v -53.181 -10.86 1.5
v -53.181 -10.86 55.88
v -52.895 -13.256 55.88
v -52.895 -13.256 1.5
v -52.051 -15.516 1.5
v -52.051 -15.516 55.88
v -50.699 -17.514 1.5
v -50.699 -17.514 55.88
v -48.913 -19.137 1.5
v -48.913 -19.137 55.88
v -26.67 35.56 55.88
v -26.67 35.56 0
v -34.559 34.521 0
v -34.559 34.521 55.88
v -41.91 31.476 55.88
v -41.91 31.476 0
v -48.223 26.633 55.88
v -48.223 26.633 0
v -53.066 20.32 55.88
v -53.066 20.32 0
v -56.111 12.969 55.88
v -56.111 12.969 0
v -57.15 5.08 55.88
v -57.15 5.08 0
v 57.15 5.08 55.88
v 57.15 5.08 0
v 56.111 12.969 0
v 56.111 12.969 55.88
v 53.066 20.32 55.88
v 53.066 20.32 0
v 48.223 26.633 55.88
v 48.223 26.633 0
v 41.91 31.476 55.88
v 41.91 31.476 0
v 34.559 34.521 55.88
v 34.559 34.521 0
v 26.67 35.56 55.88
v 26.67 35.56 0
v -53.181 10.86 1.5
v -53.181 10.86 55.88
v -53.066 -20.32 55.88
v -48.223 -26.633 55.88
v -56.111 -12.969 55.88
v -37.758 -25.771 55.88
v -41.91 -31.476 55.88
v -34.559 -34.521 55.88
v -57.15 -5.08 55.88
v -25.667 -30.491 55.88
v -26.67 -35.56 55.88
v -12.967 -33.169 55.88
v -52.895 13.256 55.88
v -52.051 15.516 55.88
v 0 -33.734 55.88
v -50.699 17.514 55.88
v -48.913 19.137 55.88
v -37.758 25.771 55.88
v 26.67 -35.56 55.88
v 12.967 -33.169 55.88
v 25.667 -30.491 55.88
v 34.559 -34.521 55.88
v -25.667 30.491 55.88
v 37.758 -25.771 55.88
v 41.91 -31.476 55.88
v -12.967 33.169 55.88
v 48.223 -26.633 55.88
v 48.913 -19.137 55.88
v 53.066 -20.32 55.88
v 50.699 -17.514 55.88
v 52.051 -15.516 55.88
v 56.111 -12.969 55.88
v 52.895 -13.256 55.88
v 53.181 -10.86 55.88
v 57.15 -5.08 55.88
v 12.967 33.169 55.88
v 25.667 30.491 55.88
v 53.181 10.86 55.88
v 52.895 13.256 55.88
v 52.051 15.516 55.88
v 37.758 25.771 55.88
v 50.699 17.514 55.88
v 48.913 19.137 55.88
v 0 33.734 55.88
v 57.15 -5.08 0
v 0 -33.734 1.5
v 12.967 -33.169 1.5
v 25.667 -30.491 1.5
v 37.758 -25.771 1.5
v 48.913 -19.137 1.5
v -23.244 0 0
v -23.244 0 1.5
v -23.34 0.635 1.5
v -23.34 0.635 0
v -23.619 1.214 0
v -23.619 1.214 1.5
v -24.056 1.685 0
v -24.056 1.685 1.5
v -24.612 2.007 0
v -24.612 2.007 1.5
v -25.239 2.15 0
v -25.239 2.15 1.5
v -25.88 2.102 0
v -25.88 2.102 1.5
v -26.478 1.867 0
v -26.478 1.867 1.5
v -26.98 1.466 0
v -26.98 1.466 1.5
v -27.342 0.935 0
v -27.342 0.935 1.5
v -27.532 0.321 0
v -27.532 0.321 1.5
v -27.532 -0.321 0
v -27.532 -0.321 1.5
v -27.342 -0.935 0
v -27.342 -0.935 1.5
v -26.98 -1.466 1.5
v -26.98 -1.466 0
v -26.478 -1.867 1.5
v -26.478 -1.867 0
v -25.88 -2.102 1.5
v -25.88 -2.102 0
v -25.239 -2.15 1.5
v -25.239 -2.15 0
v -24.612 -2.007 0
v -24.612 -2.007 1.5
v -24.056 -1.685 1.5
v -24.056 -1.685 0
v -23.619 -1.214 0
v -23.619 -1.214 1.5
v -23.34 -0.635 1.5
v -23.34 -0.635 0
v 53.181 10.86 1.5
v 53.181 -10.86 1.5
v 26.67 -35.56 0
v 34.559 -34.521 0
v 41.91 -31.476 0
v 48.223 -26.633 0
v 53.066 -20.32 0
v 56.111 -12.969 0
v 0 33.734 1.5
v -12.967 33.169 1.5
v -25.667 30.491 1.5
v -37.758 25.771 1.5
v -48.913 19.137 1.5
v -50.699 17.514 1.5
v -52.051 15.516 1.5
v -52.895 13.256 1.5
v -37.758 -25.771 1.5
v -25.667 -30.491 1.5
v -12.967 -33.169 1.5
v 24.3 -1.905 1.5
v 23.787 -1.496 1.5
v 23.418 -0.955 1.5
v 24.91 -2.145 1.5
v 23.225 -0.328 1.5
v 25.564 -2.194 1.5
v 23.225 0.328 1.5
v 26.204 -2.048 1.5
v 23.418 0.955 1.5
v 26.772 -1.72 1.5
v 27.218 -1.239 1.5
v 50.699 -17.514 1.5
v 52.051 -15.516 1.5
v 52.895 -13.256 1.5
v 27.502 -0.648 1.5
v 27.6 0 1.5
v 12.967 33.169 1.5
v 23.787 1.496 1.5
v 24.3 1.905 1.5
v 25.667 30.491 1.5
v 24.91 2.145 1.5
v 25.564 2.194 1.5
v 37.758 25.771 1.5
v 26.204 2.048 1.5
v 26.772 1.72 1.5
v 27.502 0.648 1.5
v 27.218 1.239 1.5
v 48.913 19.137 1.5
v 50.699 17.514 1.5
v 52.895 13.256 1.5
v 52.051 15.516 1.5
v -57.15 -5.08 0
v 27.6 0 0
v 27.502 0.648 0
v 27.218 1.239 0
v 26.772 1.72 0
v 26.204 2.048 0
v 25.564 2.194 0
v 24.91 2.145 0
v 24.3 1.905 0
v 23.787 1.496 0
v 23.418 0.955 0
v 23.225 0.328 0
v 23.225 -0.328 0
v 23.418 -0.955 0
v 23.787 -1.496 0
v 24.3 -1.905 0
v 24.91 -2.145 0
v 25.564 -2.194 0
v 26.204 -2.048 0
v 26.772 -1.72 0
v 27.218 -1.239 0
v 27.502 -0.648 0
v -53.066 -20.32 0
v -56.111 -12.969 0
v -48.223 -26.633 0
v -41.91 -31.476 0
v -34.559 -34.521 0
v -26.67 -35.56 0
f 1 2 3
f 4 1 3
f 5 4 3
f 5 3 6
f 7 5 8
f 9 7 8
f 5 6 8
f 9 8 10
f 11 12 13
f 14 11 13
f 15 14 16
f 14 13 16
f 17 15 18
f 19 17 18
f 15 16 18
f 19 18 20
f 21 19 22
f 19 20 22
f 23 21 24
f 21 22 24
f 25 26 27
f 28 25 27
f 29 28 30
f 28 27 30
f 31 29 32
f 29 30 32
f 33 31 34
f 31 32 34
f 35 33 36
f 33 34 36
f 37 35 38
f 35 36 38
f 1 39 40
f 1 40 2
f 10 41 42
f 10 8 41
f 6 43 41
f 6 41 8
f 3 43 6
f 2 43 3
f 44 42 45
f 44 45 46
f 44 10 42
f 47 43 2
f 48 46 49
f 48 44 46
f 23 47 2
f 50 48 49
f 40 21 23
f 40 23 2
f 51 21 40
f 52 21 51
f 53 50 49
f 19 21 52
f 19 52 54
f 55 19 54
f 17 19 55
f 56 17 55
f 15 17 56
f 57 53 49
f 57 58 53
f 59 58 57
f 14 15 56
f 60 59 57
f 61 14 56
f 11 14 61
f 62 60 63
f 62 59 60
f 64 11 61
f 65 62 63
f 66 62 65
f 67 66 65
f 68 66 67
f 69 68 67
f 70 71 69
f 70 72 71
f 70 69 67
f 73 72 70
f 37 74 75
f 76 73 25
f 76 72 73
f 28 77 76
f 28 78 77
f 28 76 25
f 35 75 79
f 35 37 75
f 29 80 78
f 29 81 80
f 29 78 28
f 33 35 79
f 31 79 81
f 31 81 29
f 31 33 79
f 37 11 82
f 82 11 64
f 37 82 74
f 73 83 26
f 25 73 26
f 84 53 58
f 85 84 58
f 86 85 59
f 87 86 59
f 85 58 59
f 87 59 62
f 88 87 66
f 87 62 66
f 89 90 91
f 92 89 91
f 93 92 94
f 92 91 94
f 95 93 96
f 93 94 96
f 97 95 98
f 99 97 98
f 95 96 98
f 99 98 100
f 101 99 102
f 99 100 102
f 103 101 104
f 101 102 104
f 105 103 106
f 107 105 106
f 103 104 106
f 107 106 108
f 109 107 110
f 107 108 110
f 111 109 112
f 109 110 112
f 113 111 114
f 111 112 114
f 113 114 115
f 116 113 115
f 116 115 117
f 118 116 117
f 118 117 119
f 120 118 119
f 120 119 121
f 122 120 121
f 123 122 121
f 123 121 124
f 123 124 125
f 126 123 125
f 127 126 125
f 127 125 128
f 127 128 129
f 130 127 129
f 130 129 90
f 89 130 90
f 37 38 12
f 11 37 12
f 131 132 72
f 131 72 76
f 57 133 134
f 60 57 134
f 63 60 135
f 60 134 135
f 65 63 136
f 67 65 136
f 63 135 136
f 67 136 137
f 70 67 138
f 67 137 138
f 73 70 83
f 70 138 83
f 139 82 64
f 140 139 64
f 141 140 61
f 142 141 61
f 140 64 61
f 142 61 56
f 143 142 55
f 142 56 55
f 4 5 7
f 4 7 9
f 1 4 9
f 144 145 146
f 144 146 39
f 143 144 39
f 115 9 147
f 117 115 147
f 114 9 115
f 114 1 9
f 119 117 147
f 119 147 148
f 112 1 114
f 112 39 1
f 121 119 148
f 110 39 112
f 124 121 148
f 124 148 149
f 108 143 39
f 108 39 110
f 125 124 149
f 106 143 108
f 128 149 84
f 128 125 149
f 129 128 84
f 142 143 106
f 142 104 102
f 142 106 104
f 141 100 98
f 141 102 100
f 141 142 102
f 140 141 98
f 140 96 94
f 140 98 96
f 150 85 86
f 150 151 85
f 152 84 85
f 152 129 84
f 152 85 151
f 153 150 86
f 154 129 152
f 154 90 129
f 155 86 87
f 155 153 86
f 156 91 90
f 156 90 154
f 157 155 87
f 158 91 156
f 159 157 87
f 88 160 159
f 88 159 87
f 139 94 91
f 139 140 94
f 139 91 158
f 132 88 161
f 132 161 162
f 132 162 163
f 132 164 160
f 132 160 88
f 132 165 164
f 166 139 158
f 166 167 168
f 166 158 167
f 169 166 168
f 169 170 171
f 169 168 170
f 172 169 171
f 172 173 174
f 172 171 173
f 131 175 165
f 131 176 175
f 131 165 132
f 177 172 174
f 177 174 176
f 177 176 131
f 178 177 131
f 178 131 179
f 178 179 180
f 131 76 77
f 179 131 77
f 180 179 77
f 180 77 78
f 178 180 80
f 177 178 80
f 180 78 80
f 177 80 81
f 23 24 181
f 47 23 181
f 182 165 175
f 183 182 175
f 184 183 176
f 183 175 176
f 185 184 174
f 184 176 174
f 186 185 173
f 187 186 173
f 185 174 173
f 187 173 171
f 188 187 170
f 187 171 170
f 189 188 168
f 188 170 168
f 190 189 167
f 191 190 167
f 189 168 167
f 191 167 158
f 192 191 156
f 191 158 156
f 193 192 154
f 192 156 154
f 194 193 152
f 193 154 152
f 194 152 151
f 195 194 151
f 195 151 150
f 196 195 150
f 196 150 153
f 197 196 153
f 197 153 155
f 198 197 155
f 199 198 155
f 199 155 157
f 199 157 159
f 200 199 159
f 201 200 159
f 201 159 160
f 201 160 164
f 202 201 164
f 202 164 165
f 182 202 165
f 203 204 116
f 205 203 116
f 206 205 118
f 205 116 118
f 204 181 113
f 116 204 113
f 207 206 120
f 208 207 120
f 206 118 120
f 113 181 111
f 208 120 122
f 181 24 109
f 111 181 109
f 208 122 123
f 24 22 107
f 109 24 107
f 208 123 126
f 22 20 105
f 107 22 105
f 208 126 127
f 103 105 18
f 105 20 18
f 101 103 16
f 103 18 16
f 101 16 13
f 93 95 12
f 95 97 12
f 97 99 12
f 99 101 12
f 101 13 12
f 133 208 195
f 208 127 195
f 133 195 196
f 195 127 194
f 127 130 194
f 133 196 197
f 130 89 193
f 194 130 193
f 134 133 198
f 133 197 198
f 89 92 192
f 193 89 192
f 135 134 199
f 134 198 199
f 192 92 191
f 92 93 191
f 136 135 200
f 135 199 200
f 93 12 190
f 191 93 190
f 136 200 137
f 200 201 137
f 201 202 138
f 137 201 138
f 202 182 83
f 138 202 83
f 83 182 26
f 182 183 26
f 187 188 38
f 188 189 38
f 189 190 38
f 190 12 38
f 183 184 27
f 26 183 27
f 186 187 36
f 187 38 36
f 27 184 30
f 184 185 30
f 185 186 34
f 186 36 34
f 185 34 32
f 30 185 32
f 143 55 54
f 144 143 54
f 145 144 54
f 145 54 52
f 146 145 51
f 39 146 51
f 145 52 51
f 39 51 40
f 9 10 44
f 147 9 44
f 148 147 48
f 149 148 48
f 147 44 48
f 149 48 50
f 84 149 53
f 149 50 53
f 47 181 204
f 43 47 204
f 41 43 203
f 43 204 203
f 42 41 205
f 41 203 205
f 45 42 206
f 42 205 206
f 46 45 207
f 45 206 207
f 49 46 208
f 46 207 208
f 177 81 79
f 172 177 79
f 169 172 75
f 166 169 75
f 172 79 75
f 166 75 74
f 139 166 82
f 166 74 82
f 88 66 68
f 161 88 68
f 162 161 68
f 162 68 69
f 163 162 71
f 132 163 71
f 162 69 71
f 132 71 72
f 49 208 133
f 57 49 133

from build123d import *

# Parameters (mm, degrees)
F1_DEPTH = 55.88
F3_DEPTH = 54.38
F4_R     = 2.1556257218
F4_R_2   = 2.2
F5_DEPTH = 1.501


with BuildPart() as f1:
    # F0 (on Top) → F1 (new body)
    with BuildSketch(Plane.XY):
        with BuildLine():
            Line((26.67, 35.56), (-26.67, 35.56))
            ThreePointArc((-26.67, 35.56), (-48.2226146906, 26.6326146906), (-57.15, 5.08))
            Line((-57.15, 5.08), (-57.15, -5.08))
            ThreePointArc((-57.15, -5.08), (-48.2226146906, -26.6326146906), (-26.67, -35.56))
            Line((-26.67, -35.56), (26.67, -35.56))
            ThreePointArc((26.67, -35.56), (48.2226146906, -26.6326146906), (57.15, -5.08))
            Line((57.15, -5.08), (57.15, 5.08))
            ThreePointArc((57.15, 5.08), (48.2226146906, 26.6326146906), (26.67, 35.56))
        make_face()
    extrude(amount=F1_DEPTH)

    # F2 (on face) → F3 (cut, through all)
    with BuildSketch(Plane.XY.offset(55.88)):
        with BuildLine():
            ThreePointArc((48.9134000813, 19.1371286276), (25.6668993073, 30.4909660232), (0, 33.734375))
            ThreePointArc((0, 33.734375), (-25.6668993073, 30.4909660232), (-48.9134000813, 19.1371286276))
            ThreePointArc((-48.9134000813, 19.1371286276), (-52.0514727222, 15.5164140041), (-53.18125, 10.8601625518))
            Line((-53.18125, 10.8601625518), (-53.18125, 0))
            Line((-53.18125, 0), (-53.18125, -10.8601625518))
            ThreePointArc((-53.18125, -10.8601625518), (-52.0514727222, -15.5164140041), (-48.9134000813, -19.1371286276))
            ThreePointArc((-48.9134000813, -19.1371286276), (-25.6668993073, -30.4909660232), (0, -33.734375))
            ThreePointArc((0, -33.734375), (25.6668993073, -30.4909660232), (48.9134000813, -19.1371286276))
            ThreePointArc((48.9134000813, -19.1371286276), (52.0514727222, -15.5164140041), (53.18125, -10.8601625518))
            Line((53.18125, -10.8601625518), (53.18125, 0))
            Line((53.18125, 0), (53.18125, 10.8601625518))
            ThreePointArc((53.18125, 10.8601625518), (52.0514727222, 15.5164140041), (48.9134000813, 19.1371286276))
        make_face()
    extrude(amount=-F3_DEPTH, mode=Mode.SUBTRACT)

    # F4 (on face) → F5 (cut, through all)
    with BuildSketch(Plane.XY.offset(1.5)):
        with Locations((-25.4, 0)):
            Circle(F4_R)
        with Locations((25.4, 0)):
            Circle(F4_R_2)
    extrude(amount=-F5_DEPTH, mode=Mode.SUBTRACT)


solid = f1.part
